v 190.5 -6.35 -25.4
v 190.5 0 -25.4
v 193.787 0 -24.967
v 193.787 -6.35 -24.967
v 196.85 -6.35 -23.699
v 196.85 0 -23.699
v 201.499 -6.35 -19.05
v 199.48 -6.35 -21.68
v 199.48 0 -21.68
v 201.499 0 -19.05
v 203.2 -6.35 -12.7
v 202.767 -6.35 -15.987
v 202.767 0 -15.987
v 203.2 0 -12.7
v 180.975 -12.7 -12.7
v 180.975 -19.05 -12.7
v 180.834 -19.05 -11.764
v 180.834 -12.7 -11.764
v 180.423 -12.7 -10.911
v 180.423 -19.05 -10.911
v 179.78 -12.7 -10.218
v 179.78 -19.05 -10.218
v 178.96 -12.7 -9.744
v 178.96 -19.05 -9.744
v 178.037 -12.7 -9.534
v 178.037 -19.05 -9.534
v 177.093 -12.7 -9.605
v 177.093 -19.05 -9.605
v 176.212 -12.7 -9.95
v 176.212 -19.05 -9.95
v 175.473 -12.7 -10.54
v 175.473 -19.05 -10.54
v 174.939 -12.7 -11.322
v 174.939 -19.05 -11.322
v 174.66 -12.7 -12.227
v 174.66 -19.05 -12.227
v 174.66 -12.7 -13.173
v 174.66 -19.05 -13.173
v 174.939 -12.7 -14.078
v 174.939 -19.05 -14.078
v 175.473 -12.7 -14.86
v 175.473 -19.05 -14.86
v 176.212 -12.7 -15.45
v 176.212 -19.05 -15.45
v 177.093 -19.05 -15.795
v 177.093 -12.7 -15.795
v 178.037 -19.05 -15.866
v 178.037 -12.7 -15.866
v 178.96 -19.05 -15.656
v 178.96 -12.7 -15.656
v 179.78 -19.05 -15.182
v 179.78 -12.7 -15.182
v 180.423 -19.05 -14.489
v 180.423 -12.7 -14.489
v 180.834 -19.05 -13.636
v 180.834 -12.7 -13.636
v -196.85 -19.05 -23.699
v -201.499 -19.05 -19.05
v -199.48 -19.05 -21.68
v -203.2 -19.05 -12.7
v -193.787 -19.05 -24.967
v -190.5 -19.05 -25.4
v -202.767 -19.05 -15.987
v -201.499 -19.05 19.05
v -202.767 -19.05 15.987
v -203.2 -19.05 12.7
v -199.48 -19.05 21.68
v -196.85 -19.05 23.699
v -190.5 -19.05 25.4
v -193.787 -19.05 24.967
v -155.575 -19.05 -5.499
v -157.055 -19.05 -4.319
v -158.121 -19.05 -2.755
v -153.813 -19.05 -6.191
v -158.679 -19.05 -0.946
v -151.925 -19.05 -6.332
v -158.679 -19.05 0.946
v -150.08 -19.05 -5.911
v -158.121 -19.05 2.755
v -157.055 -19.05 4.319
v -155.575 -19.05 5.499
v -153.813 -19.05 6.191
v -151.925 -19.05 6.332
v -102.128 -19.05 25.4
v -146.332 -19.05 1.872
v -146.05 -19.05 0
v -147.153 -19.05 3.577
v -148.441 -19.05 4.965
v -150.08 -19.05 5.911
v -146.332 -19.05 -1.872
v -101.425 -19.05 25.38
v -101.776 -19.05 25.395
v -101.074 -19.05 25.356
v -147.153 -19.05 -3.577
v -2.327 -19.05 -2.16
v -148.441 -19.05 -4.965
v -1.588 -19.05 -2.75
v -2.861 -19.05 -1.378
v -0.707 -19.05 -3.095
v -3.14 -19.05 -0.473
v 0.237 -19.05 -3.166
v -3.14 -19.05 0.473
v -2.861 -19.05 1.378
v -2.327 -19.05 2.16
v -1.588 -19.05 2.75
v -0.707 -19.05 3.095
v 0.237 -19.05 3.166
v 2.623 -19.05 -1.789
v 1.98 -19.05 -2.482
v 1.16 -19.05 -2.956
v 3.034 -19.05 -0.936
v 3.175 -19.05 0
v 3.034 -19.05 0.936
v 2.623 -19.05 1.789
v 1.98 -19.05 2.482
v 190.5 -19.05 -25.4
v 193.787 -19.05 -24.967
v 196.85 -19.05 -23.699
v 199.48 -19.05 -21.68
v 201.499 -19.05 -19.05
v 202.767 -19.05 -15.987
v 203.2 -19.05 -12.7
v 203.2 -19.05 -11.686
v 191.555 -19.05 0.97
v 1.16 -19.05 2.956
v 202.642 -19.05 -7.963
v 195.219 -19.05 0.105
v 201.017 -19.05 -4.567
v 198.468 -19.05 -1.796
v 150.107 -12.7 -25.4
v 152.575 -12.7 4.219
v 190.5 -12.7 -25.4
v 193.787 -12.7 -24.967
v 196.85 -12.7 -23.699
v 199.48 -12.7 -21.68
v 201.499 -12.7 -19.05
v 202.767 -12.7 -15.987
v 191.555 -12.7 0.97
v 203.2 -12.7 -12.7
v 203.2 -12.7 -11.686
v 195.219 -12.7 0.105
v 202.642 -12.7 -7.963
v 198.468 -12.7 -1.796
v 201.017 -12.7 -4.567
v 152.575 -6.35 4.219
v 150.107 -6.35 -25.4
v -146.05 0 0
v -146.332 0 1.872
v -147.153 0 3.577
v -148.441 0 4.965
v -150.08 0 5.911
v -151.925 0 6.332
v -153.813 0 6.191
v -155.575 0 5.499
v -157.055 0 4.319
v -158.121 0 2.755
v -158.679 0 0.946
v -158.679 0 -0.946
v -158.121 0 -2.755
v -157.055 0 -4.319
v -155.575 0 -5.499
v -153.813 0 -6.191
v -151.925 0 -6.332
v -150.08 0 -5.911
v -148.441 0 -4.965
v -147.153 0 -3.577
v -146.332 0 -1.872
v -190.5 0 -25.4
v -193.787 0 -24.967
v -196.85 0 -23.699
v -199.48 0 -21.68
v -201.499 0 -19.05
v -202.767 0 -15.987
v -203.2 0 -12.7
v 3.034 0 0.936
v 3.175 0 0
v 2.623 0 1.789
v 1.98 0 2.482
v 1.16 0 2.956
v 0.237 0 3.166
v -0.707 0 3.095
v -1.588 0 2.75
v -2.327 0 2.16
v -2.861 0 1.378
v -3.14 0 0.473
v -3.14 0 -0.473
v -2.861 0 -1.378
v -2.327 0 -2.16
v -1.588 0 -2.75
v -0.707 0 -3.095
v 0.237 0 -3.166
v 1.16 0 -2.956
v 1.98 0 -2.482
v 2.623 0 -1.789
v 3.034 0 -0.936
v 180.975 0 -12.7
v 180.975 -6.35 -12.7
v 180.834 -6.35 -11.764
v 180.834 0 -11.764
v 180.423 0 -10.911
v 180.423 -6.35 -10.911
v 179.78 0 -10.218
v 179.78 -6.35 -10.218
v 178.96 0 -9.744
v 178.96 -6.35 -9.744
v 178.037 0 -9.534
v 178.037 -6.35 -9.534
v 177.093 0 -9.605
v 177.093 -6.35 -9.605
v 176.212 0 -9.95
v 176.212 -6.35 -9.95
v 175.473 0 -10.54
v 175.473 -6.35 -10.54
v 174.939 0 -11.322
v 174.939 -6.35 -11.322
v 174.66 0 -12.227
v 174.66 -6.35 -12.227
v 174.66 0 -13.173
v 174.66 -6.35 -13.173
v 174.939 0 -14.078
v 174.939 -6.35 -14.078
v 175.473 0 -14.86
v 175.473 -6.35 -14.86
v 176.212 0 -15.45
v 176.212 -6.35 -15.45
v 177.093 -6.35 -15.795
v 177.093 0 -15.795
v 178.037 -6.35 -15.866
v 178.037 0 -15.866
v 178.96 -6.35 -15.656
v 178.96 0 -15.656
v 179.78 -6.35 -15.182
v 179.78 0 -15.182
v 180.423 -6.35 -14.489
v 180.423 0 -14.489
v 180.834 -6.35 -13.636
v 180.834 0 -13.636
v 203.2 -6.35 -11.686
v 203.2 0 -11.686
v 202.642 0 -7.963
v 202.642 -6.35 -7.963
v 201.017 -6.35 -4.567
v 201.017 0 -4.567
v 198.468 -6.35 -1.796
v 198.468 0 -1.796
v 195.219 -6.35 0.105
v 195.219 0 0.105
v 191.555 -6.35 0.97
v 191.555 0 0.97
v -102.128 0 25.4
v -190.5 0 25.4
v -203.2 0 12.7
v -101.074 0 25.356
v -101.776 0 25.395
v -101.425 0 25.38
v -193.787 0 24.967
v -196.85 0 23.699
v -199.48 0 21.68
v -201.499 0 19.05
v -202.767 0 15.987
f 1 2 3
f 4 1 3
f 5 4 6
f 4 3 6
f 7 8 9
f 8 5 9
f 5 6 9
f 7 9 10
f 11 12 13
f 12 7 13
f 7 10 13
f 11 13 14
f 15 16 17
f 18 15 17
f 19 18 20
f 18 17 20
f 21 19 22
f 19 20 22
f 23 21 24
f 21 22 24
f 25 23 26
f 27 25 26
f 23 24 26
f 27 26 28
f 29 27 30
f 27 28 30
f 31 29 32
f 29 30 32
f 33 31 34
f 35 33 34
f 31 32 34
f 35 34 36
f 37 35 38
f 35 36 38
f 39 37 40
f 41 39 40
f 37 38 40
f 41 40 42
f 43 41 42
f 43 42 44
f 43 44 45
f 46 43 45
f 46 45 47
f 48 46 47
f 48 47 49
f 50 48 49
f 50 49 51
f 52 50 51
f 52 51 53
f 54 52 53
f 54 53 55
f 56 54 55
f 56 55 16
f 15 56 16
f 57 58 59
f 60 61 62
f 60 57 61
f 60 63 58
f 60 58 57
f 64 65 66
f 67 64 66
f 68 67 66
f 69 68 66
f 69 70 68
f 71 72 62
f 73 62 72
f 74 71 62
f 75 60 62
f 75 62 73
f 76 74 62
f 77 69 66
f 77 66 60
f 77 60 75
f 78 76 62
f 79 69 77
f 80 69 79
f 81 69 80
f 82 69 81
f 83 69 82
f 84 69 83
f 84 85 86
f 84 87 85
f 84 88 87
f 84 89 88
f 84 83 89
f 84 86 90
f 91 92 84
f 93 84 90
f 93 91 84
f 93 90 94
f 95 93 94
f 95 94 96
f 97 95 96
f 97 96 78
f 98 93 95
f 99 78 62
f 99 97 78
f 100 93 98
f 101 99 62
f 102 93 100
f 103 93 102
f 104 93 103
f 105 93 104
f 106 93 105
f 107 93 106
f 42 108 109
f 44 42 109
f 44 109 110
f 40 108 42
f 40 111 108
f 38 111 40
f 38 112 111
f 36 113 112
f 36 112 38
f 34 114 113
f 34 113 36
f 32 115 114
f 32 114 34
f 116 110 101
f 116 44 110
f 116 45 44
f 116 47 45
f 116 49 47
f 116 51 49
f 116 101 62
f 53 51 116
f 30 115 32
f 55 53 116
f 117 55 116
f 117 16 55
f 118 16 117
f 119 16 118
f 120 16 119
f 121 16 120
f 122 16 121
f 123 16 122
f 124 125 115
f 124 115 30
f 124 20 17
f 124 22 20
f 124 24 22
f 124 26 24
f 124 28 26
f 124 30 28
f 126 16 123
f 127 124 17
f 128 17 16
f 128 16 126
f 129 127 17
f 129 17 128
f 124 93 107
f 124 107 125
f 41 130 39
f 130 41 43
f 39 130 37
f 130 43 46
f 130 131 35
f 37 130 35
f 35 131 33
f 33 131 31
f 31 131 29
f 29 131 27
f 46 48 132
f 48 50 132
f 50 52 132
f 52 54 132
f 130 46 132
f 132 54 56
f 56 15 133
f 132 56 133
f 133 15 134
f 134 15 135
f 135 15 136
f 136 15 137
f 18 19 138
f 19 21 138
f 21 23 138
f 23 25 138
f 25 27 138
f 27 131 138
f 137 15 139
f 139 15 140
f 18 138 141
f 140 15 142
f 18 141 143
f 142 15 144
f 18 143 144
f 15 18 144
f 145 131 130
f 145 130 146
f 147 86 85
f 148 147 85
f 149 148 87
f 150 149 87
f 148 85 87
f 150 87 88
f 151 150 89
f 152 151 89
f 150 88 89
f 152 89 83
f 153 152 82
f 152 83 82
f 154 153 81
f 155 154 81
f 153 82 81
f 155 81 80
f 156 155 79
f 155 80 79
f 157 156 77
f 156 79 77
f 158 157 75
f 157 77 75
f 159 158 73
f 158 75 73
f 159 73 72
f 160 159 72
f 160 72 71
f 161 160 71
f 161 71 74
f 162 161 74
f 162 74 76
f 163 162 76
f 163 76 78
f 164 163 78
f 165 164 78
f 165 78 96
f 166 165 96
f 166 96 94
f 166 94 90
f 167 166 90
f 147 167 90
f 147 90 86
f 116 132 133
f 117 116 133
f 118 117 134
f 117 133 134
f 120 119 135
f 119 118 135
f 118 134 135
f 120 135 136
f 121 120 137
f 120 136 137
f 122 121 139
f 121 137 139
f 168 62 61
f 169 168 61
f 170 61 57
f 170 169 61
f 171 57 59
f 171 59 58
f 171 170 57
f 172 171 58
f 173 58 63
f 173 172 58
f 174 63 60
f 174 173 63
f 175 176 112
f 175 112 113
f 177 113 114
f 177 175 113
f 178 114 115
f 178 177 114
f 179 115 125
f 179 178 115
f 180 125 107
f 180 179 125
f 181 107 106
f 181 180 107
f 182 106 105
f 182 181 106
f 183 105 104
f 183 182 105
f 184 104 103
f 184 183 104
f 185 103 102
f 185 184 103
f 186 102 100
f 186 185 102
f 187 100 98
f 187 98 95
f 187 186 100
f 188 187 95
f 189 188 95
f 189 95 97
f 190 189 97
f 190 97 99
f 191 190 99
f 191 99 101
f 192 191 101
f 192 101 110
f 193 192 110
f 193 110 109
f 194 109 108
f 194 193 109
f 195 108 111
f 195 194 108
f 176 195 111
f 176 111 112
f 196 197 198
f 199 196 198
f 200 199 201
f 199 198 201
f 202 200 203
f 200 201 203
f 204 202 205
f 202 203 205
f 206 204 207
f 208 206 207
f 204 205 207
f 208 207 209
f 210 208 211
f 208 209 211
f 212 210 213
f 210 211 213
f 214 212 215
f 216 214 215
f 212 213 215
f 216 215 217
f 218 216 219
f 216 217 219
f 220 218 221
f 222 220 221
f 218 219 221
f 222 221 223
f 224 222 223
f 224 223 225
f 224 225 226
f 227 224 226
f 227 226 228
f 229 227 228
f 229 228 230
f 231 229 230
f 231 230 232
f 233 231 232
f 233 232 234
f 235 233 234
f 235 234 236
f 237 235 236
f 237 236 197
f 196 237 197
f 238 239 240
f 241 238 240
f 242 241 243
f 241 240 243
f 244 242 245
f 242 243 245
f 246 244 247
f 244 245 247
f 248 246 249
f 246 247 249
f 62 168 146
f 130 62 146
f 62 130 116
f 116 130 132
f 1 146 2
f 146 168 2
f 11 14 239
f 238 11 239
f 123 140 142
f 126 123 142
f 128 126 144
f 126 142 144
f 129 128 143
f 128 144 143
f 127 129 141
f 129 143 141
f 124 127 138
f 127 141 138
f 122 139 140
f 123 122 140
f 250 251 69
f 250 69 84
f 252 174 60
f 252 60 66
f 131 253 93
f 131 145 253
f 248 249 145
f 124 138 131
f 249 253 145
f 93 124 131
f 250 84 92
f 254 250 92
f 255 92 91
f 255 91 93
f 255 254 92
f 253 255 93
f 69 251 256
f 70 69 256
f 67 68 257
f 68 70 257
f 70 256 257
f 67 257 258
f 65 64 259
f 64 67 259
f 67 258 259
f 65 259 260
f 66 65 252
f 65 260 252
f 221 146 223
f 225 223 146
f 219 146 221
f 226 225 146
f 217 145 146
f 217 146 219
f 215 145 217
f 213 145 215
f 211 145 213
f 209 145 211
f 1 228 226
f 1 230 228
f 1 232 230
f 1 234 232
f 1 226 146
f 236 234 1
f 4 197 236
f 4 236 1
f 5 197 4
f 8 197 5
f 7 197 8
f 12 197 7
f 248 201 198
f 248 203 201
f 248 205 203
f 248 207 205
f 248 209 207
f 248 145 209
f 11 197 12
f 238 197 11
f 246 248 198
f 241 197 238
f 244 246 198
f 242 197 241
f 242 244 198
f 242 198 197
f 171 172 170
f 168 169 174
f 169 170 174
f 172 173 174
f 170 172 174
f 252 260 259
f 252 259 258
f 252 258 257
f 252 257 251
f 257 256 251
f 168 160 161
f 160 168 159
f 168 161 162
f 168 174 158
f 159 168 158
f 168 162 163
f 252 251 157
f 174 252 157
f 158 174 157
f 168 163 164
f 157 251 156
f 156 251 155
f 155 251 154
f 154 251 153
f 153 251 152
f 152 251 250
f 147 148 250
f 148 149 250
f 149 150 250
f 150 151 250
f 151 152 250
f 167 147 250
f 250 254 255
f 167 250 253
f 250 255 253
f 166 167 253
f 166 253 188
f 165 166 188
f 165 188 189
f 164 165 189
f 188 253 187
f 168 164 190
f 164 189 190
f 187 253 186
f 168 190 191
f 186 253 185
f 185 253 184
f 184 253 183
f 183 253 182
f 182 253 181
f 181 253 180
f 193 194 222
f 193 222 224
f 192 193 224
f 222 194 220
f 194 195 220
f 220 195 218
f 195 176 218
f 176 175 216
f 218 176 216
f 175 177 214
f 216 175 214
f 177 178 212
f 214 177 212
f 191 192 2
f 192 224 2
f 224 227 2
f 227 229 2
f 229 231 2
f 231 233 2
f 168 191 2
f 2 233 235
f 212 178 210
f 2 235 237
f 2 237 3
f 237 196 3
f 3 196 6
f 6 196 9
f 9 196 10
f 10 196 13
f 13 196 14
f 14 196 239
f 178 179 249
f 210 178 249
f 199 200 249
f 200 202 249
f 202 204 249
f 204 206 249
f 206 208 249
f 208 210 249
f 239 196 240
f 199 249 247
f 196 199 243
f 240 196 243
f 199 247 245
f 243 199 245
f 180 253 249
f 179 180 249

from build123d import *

# Parameters (mm, degrees)
F0_W          = 406.4
F0_H          = 50.8
F0_R          = 3.175
F1_DEPTH      = 19.05
F2_SIZE2      = 25.4
F2_SIZE       = 304.8
F3_R          = 6.35
F4_DEPTH      = 19.051
F5_R          = 3.175
F6_DEPTH      = 19.051
F7_W          = 50.8
F7_H          = 6.35
F8_DEPTH      = 59.062945272
F9_W          = 6.35
F9_H          = 25.4
F10_DEPTH     = 2.54
F11_T1_DEPTH  = 82.55
F11_T3_DEPTH  = 69.85
F11_T5_DEPTH  = 69.85
F11_T7_DEPTH  = 64.7784379794
F11_T9_DEPTH  = 64.7784379794
F11_T11_DEPTH = 21.6912557533


# Not quite as in the source:
# - a fillet or chamfer that OpenCascade refuses, or shapes differently, is made with other operations: its cross-section is extruded or revolved along the edge and cut away or added


with BuildPart() as f1:
    # F0 (on Front) → F1 (new body)
    with BuildSketch(Plane.XZ):
        Rectangle(F0_W, F0_H)
        Circle(F0_R, mode=Mode.SUBTRACT)
    extrude(amount=F1_DEPTH)

    # F2
    f2_edges = [f1.edges().sort_by_distance(p)[0] for p in [
        (203.2, -9.525, 25.4),
    ]]
    f2_side = f1.faces().sort_by_distance((0, -9.525, 25.4))[0]
    chamfer(f2_edges, length=F2_SIZE, length2=F2_SIZE2, reference=f2_side)

    # F3 (on face) → F4 (cut, through all)
    with BuildSketch(Plane.XZ.offset(19.05)):
        with Locations((-152.4, 0)):
            Circle(F3_R)
    extrude(amount=-F4_DEPTH, mode=Mode.SUBTRACT)

    # F5 (on face) → F6 (cut, through all)
    with BuildSketch(Plane.XZ.offset(19.05)):
        with Locations((177.8, -12.7)):
            Circle(F5_R)
    extrude(amount=-F6_DEPTH, mode=Mode.SUBTRACT)

    # F7 (on face) → F8 (cut, through all)
    with BuildSketch(Plane(origin=(1.4013793103, 0, 16.8165517241), x_dir=(0.9965457582, 0, -0.0830454799), z_dir=(0.0830454799, 0, 0.9965457582))):
        with Locations((177.0980980754, -9.525)):
            Rectangle(F7_W, F7_H)
    extrude(amount=-F8_DEPTH, mode=Mode.SUBTRACT)

    # F9 (on face) → F10 (cut)
    with BuildSketch(Plane.YZ.offset(203.2)):
        with Locations((-9.525, -12.7)):
            Rectangle(F9_W, F9_H)
    extrude(amount=-F10_DEPTH, mode=Mode.SUBTRACT)

    # F11: fillet of radius 12.7 on 7 edges, made by hand

    # F11_s2 → F11_t1 (cut)
    with BuildSketch(Plane.XZ.offset(-31.75)):
        with BuildLine():
            ThreePointArc((-190.5, 25.4), (-199.4802561211, 21.6802561211), (-203.2, 12.7))
            Line((-203.2, 12.7), (-203.2, 25.4))
            Line((-203.2, 25.4), (-190.5, 25.4))
        make_face()
        with BuildLine():
            ThreePointArc((-190.5, -25.4), (-199.4802561211, -21.6802561211), (-203.2, -12.7))
            Line((-203.2, -12.7), (-203.2, -25.4))
            Line((-203.2, -25.4), (-190.5, -25.4))
        make_face()
    extrude(amount=F11_T1_DEPTH, mode=Mode.SUBTRACT)

    # F11_s4 → F11_t3 (cut)
    with BuildSketch(Plane.XZ.offset(-19.05)):
        with BuildLine():
            ThreePointArc((190.5, -25.4), (199.4802561211, -21.6802561211), (203.2, -12.7))
            Line((203.2, -12.7), (203.2, -25.4))
            Line((203.2, -25.4), (190.5, -25.4))
        make_face()
    extrude(amount=F11_T3_DEPTH, mode=Mode.SUBTRACT)

    # F11_s6 → F11_t5 (cut)
    with BuildSketch(Plane.XZ.offset(-31.75)):
        with BuildLine():
            ThreePointArc((203.2, -12.7), (199.4802561211, -21.6802561211), (190.5, -25.4))
            Line((190.5, -25.4), (203.2, -25.4))
            Line((203.2, -25.4), (203.2, -12.7))
        make_face()
    extrude(amount=F11_T5_DEPTH, mode=Mode.SUBTRACT)

    # F11_s8 → F11_t7 (cut)
    with BuildSketch(Plane.XZ.offset(-29.2142189897)):
        with BuildLine():
            ThreePointArc((203.2, -11.6856875959), (199.8457050415, -3.0863970858), (191.5546775941, 0.9704435338))
            Line((191.5546775941, 0.9704435338), (203.2, 0))
            Line((203.2, 0), (203.2, -11.6856875959))
        make_face()
    extrude(amount=F11_T7_DEPTH, mode=Mode.SUBTRACT)

    # F11_s10 → F11_t9 (cut)
    with BuildSketch(Plane.XZ.offset(-16.5142189897)):
        with BuildLine():
            ThreePointArc((203.2, -11.6856875959), (199.8457050415, -3.0863970858), (191.5546775941, 0.9704435338))
            Line((191.5546775941, 0.9704435338), (203.2, 0))
            Line((203.2, 0), (203.2, -11.6856875959))
        make_face()
    extrude(amount=F11_T9_DEPTH, mode=Mode.SUBTRACT)

    # F11_s12 → F11_t11 (cut)
    with BuildSketch(Plane.XZ.offset(-1.3206278767)):
        with BuildLine():
            ThreePointArc((-102.1282511507, 25.4), (-101.6004563739, 25.3890280429), (-101.0735735565, 25.3561311297))
            Line((-101.0735735565, 25.3561311297), (-101.6, 25.4))
            Line((-101.6, 25.4), (-102.1282511507, 25.4))
        make_face()
    extrude(amount=F11_T11_DEPTH, mode=Mode.SUBTRACT)


solid = f1.part
